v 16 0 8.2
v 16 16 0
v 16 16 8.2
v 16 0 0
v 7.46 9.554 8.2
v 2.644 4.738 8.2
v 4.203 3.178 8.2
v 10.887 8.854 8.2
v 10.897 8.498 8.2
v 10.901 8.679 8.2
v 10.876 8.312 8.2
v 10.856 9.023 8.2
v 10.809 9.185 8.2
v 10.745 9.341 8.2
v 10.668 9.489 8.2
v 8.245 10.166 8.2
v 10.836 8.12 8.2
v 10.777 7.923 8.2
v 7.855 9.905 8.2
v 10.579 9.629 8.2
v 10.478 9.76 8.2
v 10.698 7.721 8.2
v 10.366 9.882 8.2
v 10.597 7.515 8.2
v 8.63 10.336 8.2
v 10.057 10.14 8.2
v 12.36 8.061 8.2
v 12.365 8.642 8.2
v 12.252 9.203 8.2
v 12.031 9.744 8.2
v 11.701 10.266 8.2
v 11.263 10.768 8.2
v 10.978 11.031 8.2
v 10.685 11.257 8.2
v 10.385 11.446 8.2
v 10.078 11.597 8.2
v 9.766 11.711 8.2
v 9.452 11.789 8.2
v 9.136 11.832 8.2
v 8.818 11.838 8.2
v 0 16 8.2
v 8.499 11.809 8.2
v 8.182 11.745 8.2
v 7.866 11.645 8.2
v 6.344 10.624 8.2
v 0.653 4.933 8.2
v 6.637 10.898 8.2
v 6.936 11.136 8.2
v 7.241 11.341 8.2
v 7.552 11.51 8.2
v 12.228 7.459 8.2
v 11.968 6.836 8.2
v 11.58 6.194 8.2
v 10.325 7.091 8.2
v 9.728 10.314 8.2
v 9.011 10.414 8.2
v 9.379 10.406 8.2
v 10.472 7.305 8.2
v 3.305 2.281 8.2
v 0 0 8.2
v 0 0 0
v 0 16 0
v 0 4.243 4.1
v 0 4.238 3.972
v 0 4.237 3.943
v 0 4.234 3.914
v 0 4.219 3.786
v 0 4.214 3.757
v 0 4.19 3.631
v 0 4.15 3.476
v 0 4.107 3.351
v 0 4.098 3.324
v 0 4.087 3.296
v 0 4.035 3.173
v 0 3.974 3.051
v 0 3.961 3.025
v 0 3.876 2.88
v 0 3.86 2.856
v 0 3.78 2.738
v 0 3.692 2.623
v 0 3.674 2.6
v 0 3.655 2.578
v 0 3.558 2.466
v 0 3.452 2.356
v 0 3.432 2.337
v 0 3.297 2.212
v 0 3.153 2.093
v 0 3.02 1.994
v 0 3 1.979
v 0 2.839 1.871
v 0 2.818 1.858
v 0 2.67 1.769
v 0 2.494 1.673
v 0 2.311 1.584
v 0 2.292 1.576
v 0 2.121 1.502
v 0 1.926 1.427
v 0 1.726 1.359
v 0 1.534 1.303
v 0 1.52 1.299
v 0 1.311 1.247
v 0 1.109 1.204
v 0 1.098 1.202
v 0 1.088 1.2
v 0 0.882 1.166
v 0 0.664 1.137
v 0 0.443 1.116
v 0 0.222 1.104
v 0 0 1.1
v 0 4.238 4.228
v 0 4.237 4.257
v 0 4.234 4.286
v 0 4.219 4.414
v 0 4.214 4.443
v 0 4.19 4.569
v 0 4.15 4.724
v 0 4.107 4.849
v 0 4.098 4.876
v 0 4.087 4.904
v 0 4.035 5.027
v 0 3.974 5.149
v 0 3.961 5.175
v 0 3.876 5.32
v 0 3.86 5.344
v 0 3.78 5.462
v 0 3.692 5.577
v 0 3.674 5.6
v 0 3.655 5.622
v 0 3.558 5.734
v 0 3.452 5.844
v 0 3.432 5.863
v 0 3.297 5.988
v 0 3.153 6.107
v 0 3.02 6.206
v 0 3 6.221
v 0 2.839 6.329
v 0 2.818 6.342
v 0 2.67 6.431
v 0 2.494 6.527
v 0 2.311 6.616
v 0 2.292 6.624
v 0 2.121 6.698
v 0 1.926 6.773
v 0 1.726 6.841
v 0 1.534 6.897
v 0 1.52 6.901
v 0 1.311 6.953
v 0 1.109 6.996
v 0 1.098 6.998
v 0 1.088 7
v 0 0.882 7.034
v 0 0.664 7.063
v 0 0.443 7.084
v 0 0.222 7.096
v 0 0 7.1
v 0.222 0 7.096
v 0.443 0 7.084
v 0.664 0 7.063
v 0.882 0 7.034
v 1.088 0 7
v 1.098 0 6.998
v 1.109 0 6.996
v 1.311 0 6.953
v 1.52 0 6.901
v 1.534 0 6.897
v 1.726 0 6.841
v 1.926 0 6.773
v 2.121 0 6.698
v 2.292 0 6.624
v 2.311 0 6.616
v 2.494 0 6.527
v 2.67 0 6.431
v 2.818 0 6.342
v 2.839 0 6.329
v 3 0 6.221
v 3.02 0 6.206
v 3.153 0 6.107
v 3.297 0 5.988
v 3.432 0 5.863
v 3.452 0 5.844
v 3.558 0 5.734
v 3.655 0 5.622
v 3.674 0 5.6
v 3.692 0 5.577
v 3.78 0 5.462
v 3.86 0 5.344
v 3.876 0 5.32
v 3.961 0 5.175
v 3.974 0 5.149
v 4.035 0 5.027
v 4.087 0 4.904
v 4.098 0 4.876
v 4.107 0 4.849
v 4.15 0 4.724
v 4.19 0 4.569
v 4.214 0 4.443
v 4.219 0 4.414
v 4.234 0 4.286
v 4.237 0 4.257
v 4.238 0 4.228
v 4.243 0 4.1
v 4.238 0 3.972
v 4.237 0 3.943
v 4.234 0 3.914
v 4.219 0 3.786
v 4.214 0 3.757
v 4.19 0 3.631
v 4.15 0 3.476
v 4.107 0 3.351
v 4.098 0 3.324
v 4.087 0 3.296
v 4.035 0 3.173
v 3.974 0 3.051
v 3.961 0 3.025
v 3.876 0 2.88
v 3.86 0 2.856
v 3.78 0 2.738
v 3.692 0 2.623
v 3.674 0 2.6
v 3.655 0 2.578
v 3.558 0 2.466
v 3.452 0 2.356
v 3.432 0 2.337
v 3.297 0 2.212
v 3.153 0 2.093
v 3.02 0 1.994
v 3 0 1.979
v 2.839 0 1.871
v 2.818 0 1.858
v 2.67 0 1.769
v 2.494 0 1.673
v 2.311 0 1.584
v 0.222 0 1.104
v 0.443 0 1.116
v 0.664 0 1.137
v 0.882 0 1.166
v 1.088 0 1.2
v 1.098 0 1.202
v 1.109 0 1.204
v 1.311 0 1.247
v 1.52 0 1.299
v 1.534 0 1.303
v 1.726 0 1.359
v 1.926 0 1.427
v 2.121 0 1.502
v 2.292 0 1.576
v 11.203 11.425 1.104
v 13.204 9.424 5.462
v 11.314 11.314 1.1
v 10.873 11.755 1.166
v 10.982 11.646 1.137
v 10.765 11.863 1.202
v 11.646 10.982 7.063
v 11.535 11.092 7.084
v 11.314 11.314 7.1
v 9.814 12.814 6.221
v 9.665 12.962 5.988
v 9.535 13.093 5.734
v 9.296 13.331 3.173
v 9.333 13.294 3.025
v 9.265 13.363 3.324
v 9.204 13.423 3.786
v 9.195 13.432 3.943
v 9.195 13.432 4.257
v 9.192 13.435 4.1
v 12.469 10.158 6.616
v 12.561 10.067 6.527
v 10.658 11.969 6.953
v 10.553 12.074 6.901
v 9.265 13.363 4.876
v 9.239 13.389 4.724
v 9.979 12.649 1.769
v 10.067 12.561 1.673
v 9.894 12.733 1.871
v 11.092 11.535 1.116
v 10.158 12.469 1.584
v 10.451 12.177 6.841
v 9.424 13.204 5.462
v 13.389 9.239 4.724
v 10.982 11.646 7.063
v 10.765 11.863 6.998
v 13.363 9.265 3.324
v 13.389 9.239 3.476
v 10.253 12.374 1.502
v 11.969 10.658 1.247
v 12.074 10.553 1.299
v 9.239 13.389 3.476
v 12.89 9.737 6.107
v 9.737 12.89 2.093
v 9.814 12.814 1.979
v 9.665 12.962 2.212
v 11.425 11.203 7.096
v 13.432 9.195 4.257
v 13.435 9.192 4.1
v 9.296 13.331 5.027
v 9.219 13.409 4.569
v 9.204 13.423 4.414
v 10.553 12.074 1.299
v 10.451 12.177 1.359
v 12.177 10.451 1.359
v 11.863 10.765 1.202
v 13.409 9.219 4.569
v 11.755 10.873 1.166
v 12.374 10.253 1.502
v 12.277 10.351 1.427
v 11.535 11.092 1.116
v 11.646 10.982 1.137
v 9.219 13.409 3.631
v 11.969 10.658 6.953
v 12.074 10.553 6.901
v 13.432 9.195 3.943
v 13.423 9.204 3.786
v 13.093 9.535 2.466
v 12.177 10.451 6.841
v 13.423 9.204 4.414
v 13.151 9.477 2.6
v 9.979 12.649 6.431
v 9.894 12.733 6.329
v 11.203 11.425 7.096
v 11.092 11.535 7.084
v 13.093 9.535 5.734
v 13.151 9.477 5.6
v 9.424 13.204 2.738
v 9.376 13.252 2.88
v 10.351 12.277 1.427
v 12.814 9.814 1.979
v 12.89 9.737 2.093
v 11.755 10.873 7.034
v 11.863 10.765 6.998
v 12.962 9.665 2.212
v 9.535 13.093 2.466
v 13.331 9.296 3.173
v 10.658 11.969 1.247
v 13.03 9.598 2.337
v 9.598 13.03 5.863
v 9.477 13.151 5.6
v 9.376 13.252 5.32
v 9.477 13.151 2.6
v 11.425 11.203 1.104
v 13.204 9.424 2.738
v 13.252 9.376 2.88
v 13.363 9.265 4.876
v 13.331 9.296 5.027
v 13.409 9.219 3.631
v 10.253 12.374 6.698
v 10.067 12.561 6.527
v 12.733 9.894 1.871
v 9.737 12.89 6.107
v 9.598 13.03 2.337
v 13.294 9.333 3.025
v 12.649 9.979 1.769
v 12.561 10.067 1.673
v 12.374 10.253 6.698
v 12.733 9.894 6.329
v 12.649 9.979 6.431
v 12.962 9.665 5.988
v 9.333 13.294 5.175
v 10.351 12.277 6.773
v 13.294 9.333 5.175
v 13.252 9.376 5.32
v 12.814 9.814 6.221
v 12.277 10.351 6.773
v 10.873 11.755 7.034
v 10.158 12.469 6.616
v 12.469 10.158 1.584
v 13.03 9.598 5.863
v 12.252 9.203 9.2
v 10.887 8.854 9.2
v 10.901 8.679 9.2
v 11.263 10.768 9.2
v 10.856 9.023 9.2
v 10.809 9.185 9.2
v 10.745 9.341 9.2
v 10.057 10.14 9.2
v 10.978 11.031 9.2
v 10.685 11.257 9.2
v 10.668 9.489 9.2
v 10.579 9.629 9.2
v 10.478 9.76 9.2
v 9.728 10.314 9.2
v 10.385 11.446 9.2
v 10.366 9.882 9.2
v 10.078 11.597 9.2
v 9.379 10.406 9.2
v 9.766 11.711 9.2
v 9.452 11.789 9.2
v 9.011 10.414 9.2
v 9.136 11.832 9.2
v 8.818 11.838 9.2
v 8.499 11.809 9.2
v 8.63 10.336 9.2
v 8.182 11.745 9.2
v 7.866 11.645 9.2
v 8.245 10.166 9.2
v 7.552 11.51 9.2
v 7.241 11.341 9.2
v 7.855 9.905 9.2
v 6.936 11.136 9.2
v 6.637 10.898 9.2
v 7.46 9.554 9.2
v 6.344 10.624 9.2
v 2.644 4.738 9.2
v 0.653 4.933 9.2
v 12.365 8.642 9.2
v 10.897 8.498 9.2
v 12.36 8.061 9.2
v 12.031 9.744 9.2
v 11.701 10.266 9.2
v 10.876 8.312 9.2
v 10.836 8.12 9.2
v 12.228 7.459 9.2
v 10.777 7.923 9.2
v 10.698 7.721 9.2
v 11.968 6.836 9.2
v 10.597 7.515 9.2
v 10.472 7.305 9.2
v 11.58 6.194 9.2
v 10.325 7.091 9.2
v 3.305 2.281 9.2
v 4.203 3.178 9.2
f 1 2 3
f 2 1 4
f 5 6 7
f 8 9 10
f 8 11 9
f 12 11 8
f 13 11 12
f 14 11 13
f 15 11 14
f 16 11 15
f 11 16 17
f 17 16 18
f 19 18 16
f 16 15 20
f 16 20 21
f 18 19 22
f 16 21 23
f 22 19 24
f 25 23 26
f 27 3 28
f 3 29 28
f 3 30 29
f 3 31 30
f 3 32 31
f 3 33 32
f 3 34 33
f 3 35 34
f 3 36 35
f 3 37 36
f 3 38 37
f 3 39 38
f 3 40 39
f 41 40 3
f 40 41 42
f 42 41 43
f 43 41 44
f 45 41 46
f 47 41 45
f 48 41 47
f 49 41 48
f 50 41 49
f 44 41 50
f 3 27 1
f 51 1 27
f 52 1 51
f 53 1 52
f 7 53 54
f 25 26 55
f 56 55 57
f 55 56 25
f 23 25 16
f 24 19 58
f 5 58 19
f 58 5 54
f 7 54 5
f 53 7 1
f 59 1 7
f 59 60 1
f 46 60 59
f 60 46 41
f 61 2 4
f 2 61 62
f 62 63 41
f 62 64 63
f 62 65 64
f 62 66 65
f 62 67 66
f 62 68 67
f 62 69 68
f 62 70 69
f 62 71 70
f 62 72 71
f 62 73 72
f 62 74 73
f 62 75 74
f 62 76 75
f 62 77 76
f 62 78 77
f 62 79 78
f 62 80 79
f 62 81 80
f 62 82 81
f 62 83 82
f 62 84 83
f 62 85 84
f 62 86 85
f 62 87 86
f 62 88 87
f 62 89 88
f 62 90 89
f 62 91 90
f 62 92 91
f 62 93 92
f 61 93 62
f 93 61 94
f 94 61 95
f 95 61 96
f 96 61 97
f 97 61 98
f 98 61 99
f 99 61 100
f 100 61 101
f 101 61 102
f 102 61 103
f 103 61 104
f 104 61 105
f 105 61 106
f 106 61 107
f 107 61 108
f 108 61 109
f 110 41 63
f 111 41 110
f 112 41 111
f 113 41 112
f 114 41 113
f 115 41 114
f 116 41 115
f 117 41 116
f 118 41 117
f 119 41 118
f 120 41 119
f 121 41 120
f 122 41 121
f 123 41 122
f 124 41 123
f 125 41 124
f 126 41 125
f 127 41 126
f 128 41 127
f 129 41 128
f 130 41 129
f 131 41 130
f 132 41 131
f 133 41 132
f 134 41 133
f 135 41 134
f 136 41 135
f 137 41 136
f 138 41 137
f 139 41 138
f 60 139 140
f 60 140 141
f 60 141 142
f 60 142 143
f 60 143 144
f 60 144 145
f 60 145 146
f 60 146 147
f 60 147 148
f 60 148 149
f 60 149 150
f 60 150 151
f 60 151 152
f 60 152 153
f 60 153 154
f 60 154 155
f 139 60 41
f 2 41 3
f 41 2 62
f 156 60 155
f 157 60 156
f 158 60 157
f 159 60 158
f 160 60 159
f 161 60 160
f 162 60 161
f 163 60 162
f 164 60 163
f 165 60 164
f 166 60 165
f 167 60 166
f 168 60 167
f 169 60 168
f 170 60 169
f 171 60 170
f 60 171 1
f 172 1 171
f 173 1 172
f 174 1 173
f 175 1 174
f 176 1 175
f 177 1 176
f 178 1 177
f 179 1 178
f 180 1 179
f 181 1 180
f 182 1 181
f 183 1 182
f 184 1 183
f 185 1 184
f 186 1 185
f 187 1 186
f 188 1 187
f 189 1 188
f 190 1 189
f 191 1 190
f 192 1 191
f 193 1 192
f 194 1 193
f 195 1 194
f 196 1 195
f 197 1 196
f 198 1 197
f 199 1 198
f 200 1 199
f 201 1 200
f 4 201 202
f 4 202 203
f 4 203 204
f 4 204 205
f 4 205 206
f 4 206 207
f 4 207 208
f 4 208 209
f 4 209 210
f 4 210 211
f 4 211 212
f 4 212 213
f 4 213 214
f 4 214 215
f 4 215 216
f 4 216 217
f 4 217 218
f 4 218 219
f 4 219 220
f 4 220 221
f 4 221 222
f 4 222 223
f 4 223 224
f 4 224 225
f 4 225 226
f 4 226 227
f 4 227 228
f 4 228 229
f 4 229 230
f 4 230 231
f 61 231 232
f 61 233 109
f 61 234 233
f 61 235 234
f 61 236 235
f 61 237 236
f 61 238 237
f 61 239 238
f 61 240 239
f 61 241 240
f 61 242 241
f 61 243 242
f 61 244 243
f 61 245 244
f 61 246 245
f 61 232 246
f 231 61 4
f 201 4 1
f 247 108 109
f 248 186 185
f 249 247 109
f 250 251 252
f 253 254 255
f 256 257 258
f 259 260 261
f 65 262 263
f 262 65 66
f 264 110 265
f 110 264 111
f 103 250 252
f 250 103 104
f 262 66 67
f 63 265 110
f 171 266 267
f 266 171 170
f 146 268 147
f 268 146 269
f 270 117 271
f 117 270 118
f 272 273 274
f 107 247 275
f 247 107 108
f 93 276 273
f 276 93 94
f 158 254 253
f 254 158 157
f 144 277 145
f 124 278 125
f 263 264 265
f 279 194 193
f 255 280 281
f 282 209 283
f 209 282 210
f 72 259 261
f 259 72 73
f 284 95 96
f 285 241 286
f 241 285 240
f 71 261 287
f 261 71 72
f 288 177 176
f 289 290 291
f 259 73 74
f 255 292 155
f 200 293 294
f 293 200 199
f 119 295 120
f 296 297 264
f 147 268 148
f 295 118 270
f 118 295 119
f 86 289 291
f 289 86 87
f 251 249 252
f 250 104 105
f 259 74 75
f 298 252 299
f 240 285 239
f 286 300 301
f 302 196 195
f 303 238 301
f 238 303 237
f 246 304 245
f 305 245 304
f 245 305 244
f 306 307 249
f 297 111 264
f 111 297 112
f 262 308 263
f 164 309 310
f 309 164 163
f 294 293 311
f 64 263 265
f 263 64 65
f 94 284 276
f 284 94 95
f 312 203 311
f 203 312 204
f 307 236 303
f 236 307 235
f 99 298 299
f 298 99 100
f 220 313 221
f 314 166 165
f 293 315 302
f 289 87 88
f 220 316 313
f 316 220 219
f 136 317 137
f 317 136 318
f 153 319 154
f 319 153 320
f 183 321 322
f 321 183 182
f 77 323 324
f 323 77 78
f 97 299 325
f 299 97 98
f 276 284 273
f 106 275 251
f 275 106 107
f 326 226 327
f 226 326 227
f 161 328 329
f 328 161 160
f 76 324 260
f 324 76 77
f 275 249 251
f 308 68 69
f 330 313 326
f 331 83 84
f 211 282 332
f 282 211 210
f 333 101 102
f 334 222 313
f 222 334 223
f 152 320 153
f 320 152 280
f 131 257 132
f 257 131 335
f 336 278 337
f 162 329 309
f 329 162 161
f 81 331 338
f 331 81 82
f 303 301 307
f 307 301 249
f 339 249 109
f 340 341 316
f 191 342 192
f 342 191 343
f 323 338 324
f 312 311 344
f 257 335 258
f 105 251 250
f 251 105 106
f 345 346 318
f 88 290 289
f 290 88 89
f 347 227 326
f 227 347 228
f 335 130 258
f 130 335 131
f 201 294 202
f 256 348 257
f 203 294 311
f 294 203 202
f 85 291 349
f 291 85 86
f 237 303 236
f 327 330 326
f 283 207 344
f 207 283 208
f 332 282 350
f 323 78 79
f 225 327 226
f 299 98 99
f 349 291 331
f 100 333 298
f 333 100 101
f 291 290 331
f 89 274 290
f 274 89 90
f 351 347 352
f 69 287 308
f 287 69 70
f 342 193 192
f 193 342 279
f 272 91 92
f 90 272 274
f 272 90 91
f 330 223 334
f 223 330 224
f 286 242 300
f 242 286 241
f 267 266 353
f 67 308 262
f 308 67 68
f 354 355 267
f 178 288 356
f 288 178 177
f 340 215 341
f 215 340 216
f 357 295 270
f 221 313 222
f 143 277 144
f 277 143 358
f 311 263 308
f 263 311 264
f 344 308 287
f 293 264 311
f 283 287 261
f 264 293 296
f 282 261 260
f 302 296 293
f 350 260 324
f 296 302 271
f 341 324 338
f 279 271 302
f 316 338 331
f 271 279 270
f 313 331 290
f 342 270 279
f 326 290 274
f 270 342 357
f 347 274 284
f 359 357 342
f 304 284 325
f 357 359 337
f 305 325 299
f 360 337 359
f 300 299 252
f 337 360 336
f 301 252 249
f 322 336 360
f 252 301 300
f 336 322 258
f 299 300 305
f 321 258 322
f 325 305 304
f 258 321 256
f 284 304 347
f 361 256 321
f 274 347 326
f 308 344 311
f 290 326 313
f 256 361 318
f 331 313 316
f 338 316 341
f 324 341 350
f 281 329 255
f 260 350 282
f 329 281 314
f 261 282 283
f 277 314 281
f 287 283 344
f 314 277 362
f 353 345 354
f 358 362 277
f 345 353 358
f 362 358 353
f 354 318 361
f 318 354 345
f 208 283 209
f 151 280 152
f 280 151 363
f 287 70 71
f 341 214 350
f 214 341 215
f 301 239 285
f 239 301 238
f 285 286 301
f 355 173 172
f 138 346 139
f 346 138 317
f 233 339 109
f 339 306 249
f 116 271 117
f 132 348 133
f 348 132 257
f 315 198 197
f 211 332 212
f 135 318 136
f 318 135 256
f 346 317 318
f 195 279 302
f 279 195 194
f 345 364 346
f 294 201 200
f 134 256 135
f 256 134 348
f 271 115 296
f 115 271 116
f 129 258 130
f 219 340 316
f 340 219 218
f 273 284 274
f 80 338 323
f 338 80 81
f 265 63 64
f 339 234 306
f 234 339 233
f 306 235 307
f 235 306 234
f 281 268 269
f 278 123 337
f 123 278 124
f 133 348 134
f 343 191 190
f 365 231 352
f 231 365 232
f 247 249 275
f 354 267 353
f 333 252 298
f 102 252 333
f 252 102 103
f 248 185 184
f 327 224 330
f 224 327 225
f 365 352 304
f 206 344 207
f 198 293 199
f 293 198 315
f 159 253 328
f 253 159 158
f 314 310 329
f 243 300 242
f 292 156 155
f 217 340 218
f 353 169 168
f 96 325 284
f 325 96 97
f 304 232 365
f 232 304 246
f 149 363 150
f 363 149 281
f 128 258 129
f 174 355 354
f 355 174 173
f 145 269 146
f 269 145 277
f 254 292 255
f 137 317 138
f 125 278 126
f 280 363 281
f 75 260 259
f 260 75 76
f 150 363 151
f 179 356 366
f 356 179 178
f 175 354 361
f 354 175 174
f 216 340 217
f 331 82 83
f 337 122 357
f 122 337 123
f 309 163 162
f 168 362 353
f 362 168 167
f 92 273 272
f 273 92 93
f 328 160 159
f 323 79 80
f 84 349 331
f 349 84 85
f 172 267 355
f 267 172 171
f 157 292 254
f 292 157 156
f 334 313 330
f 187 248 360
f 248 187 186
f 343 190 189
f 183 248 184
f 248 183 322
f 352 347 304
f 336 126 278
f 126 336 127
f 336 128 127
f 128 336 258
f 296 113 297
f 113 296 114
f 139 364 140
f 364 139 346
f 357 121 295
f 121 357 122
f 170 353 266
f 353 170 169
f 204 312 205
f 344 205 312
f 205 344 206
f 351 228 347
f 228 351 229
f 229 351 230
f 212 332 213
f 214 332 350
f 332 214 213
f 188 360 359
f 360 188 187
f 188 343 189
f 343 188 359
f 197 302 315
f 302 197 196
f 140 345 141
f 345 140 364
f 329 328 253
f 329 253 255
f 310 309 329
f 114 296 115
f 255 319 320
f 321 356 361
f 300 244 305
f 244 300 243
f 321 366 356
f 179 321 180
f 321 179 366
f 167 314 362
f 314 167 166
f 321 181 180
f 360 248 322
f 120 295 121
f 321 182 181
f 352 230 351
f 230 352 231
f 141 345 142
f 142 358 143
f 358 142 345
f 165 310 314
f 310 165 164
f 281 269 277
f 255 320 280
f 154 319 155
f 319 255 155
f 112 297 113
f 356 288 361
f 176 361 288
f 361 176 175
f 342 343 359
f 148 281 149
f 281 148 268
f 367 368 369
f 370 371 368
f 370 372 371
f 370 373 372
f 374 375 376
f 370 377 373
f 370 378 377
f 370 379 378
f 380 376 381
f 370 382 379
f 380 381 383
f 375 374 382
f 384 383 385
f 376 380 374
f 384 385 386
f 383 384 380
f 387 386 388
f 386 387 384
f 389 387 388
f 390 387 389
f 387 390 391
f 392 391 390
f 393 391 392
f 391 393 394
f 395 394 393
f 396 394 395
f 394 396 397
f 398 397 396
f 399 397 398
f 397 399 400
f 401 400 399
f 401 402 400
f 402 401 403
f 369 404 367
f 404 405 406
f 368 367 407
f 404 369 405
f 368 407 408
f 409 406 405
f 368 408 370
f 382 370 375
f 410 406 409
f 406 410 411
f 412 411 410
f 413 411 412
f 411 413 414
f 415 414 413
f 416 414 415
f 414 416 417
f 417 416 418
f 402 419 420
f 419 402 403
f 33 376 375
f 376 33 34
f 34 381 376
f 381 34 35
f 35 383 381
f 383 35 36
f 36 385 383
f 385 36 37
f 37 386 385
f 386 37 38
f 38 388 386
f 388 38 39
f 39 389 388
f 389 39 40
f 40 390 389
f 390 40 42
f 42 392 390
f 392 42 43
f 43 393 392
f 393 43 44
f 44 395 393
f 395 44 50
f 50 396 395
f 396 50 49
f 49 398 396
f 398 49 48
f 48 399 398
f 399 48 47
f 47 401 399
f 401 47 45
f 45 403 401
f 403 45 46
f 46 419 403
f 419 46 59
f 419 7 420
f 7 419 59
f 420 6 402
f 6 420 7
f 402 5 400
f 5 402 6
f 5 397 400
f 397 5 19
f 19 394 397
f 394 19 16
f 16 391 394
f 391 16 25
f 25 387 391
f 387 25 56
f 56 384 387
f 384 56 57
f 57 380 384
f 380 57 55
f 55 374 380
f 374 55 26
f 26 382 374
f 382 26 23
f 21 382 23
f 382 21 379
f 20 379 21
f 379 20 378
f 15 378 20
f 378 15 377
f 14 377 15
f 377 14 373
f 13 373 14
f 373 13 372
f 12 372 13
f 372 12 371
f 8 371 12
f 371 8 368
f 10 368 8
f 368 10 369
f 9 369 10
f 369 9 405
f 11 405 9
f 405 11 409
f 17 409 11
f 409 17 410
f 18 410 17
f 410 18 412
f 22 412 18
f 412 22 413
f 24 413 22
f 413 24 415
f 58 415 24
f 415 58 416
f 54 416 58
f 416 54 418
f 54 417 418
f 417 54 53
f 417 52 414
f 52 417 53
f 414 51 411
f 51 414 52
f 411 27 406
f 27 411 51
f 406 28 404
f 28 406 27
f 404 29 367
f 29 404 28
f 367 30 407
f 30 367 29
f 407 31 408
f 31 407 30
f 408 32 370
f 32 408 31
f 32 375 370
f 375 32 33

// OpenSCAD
name = "J";
font = "Arial";
size = 12;

translate([7, 7, 8.2]){
    rotate([0, 0, 135]){
        linear_extrude(height=1) {
            text(name, font=font, size=size, halign="center", valign="center");
        }
    }
}
            
difference(){
    cube([16, 16, 8.2]);
    translate([0, 0, 4.1]){
        rotate([0, 90, 45]){
            cylinder(16, $fn=120, r=3);
        }
    }
}
